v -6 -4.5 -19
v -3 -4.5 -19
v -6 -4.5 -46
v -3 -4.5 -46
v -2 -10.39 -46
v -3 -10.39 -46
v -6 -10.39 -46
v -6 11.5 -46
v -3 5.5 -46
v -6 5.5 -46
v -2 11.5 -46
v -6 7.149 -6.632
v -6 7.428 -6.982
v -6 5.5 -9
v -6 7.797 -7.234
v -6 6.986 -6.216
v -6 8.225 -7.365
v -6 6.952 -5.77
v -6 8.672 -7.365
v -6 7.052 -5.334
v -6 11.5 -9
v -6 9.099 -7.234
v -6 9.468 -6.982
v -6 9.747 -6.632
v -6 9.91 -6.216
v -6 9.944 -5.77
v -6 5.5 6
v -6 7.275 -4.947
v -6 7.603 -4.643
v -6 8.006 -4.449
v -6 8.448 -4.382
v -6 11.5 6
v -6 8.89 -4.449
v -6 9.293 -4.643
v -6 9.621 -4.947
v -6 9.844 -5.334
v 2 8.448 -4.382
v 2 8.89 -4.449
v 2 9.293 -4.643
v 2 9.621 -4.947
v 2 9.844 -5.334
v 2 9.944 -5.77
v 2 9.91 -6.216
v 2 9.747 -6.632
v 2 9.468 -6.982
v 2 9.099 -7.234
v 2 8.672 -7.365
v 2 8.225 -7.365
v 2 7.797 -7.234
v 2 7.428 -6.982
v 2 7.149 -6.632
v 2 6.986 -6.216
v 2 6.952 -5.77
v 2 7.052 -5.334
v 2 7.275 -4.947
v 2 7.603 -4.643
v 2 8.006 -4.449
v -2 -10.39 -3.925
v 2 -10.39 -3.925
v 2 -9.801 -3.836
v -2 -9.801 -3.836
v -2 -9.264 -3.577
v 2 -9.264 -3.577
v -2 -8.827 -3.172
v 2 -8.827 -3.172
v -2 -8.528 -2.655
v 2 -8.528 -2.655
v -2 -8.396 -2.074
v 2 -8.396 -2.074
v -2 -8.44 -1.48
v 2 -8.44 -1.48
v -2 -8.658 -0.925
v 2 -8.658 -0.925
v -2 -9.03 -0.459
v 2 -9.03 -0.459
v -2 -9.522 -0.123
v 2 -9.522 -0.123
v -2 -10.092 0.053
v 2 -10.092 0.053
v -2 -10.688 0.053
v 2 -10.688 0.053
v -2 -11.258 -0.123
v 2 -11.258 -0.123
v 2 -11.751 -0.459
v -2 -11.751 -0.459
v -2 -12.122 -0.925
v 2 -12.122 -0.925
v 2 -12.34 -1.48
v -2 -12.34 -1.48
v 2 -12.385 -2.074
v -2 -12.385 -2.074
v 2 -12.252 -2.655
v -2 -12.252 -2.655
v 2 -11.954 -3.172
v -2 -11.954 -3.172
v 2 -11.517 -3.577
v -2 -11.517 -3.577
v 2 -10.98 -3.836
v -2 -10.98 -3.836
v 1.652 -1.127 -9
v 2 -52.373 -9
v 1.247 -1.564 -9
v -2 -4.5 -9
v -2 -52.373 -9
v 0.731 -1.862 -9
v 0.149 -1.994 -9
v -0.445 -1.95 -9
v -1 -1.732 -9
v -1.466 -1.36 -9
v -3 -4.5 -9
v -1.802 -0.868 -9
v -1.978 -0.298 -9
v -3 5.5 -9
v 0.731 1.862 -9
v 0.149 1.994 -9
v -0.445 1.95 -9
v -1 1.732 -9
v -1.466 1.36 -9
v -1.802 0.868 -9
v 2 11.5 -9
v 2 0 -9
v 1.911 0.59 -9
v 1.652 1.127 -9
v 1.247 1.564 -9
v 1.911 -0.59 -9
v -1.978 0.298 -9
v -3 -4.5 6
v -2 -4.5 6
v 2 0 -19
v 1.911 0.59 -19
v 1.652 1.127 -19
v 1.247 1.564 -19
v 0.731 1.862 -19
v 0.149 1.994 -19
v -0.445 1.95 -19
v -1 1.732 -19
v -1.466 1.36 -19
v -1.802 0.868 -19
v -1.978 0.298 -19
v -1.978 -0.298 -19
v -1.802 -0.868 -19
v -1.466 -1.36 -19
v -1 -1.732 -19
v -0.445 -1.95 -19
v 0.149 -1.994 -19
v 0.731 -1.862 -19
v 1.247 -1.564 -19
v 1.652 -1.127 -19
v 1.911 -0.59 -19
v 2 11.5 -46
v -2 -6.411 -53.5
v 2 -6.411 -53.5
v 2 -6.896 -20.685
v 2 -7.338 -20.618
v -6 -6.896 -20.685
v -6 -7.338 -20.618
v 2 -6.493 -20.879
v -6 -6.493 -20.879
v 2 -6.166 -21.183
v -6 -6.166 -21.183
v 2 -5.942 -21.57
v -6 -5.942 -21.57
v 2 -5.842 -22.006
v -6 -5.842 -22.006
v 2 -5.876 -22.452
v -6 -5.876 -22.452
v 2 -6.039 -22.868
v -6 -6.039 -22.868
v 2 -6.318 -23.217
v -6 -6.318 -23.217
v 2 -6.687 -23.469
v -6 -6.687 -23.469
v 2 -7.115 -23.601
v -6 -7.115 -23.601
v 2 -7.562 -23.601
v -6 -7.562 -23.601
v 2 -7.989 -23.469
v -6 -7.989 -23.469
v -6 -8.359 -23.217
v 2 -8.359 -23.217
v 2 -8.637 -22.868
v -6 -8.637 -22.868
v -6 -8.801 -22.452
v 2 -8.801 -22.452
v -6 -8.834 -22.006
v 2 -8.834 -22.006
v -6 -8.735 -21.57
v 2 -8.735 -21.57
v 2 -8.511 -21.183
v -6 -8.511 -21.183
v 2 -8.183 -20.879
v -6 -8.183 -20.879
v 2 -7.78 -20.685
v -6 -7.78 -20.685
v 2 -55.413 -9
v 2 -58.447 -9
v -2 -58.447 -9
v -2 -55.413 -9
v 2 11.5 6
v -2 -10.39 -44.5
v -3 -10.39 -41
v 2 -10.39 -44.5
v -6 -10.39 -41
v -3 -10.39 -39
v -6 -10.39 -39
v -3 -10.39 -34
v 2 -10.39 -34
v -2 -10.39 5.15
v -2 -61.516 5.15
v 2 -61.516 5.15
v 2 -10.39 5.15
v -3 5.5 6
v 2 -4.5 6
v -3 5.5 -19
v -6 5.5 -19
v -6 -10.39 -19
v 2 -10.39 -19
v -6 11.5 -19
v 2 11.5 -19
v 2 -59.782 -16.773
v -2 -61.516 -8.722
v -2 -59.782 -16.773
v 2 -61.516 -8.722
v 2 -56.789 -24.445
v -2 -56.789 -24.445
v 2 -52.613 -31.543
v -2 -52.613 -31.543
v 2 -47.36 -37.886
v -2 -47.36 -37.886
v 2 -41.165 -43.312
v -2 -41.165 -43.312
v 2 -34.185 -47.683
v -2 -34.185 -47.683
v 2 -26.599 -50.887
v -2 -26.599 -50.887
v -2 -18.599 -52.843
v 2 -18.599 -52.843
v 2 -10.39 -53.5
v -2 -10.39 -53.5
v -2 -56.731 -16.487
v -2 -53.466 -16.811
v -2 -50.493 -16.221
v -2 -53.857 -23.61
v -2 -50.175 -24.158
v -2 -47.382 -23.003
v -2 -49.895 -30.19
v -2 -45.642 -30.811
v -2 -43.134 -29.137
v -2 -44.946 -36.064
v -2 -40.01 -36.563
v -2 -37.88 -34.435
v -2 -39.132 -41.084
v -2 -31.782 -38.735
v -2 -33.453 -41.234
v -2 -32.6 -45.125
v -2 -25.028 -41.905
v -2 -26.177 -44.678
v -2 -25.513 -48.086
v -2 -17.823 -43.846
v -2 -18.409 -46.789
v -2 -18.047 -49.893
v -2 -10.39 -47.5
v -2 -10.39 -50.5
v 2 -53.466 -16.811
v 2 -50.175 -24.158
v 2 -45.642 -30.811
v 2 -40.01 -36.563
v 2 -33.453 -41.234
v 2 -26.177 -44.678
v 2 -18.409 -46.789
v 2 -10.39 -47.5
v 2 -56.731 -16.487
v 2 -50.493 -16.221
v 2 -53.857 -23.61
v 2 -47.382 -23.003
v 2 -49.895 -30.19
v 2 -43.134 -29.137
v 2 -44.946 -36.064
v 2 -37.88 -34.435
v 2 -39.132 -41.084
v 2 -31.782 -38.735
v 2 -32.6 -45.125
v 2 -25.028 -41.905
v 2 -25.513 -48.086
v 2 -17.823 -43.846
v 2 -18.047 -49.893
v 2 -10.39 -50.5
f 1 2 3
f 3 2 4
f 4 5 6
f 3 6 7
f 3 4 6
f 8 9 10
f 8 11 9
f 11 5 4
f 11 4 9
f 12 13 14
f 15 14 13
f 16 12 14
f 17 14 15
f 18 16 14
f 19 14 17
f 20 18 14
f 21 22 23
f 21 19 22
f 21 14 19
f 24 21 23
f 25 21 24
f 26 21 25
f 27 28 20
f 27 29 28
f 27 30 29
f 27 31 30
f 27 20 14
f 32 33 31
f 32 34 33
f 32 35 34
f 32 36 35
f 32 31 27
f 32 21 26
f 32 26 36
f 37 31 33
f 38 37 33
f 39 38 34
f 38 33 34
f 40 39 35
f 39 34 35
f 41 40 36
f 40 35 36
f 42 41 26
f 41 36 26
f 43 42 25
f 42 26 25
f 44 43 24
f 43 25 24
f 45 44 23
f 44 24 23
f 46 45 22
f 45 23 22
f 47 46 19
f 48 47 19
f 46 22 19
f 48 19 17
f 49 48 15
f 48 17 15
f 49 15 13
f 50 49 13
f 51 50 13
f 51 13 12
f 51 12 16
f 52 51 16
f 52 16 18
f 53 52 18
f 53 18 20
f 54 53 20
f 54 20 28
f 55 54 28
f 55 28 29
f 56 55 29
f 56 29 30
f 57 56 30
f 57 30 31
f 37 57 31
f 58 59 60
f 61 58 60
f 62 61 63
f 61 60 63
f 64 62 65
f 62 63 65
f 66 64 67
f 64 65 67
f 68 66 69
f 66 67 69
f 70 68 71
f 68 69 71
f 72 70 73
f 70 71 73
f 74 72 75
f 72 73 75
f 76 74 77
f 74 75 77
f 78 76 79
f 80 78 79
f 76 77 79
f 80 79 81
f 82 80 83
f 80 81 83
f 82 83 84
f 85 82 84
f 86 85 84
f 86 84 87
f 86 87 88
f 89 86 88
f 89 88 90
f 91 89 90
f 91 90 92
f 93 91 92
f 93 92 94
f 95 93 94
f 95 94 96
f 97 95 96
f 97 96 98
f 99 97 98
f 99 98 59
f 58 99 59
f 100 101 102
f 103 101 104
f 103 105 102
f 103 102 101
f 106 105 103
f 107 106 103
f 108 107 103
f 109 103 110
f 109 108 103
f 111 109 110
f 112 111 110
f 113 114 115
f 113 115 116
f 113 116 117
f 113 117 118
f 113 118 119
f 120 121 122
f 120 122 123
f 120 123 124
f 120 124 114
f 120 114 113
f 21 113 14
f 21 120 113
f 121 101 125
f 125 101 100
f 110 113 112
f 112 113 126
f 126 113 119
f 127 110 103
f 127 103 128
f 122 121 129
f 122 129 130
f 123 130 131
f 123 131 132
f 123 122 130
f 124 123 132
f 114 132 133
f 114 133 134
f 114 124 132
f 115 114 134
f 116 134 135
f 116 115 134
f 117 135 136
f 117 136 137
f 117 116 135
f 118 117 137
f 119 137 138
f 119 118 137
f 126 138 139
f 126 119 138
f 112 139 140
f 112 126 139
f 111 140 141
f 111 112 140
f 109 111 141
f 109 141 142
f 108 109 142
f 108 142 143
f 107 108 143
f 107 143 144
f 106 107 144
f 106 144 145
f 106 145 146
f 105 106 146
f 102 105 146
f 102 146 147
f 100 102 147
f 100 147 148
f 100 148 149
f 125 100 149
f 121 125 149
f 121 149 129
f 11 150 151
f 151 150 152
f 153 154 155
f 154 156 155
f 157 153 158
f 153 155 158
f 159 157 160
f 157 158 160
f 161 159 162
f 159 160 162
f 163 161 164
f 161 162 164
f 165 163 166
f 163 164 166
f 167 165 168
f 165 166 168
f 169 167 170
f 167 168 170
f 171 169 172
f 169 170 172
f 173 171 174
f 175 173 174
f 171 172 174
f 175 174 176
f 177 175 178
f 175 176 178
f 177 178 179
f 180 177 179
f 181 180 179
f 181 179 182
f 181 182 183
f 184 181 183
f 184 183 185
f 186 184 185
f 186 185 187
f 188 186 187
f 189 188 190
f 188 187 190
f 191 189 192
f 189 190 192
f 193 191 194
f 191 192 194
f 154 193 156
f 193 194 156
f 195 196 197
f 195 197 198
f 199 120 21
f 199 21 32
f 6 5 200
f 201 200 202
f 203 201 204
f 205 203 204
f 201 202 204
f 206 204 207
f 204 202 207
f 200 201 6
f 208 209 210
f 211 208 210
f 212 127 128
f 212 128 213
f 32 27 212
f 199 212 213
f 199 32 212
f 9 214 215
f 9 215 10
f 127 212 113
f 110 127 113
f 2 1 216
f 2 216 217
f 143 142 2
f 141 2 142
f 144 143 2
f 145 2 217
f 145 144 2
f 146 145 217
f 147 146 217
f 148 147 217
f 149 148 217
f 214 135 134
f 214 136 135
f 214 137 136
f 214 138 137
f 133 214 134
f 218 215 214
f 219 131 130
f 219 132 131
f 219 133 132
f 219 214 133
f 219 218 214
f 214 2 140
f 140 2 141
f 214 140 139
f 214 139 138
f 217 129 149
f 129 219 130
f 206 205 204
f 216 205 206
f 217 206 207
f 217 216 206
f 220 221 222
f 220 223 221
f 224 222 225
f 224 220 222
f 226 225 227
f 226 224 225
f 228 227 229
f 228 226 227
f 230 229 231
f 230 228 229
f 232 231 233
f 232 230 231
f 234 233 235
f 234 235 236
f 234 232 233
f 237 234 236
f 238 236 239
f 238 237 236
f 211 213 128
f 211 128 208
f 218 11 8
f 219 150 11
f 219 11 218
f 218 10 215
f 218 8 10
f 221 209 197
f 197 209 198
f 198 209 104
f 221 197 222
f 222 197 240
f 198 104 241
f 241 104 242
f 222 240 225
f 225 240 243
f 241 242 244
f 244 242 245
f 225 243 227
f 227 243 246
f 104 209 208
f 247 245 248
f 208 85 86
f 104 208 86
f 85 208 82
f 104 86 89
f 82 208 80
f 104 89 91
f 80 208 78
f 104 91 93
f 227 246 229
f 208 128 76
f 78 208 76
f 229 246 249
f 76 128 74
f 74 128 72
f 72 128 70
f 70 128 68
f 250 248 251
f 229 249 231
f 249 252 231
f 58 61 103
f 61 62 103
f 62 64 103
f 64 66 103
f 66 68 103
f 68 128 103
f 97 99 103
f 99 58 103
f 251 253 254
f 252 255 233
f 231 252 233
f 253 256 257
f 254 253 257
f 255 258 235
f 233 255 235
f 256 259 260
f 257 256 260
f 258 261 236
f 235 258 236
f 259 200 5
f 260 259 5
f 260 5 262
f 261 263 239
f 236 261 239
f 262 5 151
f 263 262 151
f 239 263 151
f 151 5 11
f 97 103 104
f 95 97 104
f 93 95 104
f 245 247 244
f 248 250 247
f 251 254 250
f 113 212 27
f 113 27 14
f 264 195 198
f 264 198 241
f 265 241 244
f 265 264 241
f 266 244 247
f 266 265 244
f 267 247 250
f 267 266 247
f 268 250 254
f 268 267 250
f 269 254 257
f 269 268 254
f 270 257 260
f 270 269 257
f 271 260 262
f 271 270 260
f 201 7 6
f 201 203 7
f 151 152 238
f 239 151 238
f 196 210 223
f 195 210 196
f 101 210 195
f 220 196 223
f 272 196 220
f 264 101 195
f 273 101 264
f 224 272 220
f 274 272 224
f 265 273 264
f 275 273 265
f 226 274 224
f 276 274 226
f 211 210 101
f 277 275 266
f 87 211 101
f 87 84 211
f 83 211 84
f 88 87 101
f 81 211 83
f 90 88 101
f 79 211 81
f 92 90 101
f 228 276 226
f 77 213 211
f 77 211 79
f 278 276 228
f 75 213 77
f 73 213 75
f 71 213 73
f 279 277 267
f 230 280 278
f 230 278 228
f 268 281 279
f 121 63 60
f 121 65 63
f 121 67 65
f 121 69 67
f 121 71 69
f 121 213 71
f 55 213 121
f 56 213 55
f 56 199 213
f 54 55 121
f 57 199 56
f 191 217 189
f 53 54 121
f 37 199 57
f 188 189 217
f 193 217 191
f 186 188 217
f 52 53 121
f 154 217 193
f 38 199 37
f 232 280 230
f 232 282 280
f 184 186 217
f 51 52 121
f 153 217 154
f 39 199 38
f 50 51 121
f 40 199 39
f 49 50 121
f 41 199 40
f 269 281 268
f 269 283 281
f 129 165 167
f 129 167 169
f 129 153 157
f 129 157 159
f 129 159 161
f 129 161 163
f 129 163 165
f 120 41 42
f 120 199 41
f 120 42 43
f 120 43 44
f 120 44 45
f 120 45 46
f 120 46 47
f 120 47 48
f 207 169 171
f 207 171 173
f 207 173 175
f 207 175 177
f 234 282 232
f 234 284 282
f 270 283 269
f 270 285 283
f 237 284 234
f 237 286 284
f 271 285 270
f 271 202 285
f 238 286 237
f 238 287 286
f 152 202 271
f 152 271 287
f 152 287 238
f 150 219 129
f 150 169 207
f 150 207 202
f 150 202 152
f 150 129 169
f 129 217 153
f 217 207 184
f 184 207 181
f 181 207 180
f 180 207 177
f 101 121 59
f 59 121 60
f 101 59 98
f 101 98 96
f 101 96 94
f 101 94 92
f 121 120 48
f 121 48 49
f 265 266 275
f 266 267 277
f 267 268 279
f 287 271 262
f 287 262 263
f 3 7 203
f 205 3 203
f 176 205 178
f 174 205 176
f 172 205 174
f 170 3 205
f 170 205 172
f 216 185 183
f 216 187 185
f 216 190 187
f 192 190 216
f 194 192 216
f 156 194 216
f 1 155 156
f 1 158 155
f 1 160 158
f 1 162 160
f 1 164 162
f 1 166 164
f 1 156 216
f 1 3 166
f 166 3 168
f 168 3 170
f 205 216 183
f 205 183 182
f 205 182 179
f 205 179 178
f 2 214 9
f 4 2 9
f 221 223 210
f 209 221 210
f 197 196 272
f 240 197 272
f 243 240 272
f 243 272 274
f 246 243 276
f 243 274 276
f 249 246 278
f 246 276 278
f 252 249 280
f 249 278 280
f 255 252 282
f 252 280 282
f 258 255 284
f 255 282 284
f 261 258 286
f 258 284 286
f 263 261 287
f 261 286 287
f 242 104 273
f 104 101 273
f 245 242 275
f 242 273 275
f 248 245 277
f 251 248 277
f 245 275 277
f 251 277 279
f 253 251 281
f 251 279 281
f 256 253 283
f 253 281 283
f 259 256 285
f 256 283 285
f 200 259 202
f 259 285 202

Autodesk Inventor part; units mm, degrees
ref_plane "YZ Plane" through (0, 0, 0) normal (1, 0, 0) x (0, 1, 0)
ref_plane "XZ Plane" through (0, 0, 0) normal (0, 1, 0) x (-1, 0, 0)
ref_plane "XY Plane" through (0, 0, 0) normal (0, 0, 1) x (1, 0, 0)
sketch "Sketch1" plane through (0, 0, 0) normal (0, 0, 1) x (1, 0, 0)
  circle A0 centre (0, 0) radius 2
  dimension "d0" = 4
extrude "Extrusion1" add sketch "Sketch1" against normal blind 40
sketch "Sketch2" plane through (0, 0, 0) normal (0, 0, 1) x (1, 0, 0)
  circle A0 centre (0, 0) radius 2 projected
  line L0 (2, -4.5) -> (-3, -4.5)
  line L1 (-3, -4.5) -> (-3, 4.5)
  line L2 (-3, 4.5) -> (2, 4.5)
  line L3 (2, 4.5) -> (2, -4.5)
  dimension "d3" = 3
  dimension "d4" = 9
  dimension "d5" = 4.5
extrude "Extrusion2" add sketch "Sketch2" along normal blind 6 contours A0 | L3 L0 L1 L2
sketch "Sketch3" plane through (0, 0, 6) normal (0, 0, 1) x (1, 0, 0)
  circle A0 centre (0, 0) radius 2 projected
  line L0 (-3, -4.5) -> (2, -4.5) projected
  line L1 (2, -4.5) -> (2, 4.5) projected
  line L2 (2, 4.5) -> (-3, 4.5) projected
  line L3 (-3, 4.5) -> (-3, -4.5) projected
  line L4 (2, -4.5) -> (2, 4.5) projected
  line L5 (-3, 4.5) -> (2, 4.5)
  line L6 (2, 4.5) -> (2, 3.5)
  line L7 (2, 3.5) -> (-3, 3.5)
  line L8 (-3, 3.5) -> (-3, 4.5)
  point P0 (2, 0)
  dimension "d8" = 1
extrude "Extrusion3" cut sketch "Sketch3" against normal blind 6 contours L7 L3 L2 L1
sketch "Sketch4" plane through (0, 0, -40) normal (0, 0, -1) x (-1, 0, 0)
  circle A0 centre (0, 0) radius 2 projected
extrude "Extrusion4" cut sketch "Sketch4" against normal blind 6
sketch "Sketch5" plane through (0, 0, -34) normal (0, 0, -1) x (-1, 0, 0)
  line L0 (3, 3.5) -> (-2, 3.5) projected
  line L1 (3, -4.5) -> (3, 3.5) projected
  line L2 (-2, 3.5) -> (-2, 0) projected
  line L3 (-2, 0) -> (-2, -4.5) projected
  line L4 (-2, -4.5) -> (3, -4.5) projected
  line L5 (3, 3.5) -> (-2, 3.5)
  line L6 (-2, 3.5) -> (-2, -4.5)
  line L7 (-2, -4.5) -> (3, -4.5)
  line L8 (3, -4.5) -> (3, 3.5)
  point P0 (0, 0)
extrude "Extrusion5" add sketch "Sketch5" along normal blind 12
sketch "Sketch6" plane through (-3, -4.5, -34) normal (0, -1, 0) x (1, 0, 0)
  line L0 (5, 0) -> (0, 0) projected
  line L1 (0, 0) -> (0, -12) projected
  line L2 (5, -12) -> (0, -12) projected
  line L3 (5, 0) -> (5, -12) projected
  line L4 (5, -12) -> (0, -12)
  line L5 (0, -12) -> (0, 0)
  line L6 (0, 0) -> (5, 0)
  line L7 (5, 0) -> (5, -12)
  point P0 (3, 34)
extrude "Extrusion6" add sketch "Sketch6" along normal blind 110
sketch "Sketch7" plane through (2, 0, -34) normal (1, 0, 0) x (0, 0, -1)
  line L0 (0, 3.5) -> (0, 0) projected
  line L1 (0, 0) -> (0, -114.5) projected
  line L2 (12, -114.5) -> (0, -114.5) projected
  line L3 (12, 3.5) -> (12, -114.5) projected
  line L4 (0, 3.5) -> (12, 3.5) projected
  line L5 (-34, 3.5) -> (-40, 3.5) projected
  line L6 (-40, -4.5) -> (-40, 3.5) projected
  line L7 (-34, -4.5) -> (-40, -4.5) projected
  line L8 (-34, 0) -> (-34, -4.5) projected
  line L9 (-34, 3.5) -> (-34, 0) projected
  line L10 (0, 3.5) -> (0, -114.5) projected
  line L11 (0, -108.5) -> (-25, -108.5)
  line L12 (-25, -108.5) -> (-25, -114.5)
  line L13 (-25, -114.5) -> (0, -114.5)
  line L14 (0, -114.5) -> (0, -108.5)
  line L15 (0, -114.5) -> (12, -114.5) projected
  line L16 (-40, -4.5) -> (-25, -108.5)
  line L17 (-34, -4.5) -> (-19, -108.5)
  point P0 (-34, 0)
  dimension "d46" = 6
  dimension "d47" = 25
extrude "Extrusion7" add sketch "Sketch7" against normal up to surface (5 mm away) contours L1 L13 L12 L11 | L11 L16 L7 L17 | L7 L6 L5 L9 L8
sketch "Sketch8" plane through (2, 3.5, 6) normal (1, 0, 0) x (0, 0, -1)
  line L0 (6, 0) -> (0, 0) projected
  line L1 (45, -10) -> (47, -10)
  line L2 (47, -10) -> (47, -112)
  line L3 (47, -112) -> (45, -112)
  line L4 (45, -112) -> (45, -10)
  line L5 (0, -8) -> (0, 0) projected
  line L6 (6, -3.5) -> (6, -8) projected
  line L7 (6, 0) -> (6, -3.5) projected
  line L8 (0, -8) -> (15, -112) projected
  line L9 (15, -112) -> (15, -118) projected
  line L10 (52, -118) -> (15, -118) projected
  line L11 (52, 0) -> (52, -118) projected
  line L12 (40, 0) -> (52, 0) projected
  line L13 (40, 0) -> (40, -3.5) projected
  line L14 (40, -3.5) -> (40, -112) projected
  line L15 (40, -112) -> (21, -112) projected
  line L16 (21, -112) -> (6, -8) projected
  dimension "d20" = 2
  dimension "d48" = 6
  dimension "d49" = 5
  dimension "d50" = 10
extrude "Extrusion8" cut sketch "Sketch8" against normal through all contours L1 L2 L3 L4
sketch "Sketch9" plane through (-3, 3.5, 0) normal (-1, 0, 0) x (0, 0, 1)
  line L0 (6, 0) -> (0, 0) projected
  line L1 (-46, 0) -> (-46, -118) projected
  line L2 (-46, -8) -> (-46, -9)
  line L3 (-34, -3.5) -> (-34, -112) projected
  line L4 (-34, -8) -> (-34, -9)
  line L5 (0, -8) -> (-0.8495, -13.8902)
  line L6 (-46, -9) -> (-34, -9)
  line L7 (6, -8) -> (0, -8)
  line L8 (-34, -8) -> (-46, -8)
  line L9 (0, -8) -> (0, 0) projected
  line L10 (6, 0) -> (6, -8) projected
  line L11 (-15, -112) -> (0, -8) projected
  line L12 (-34, -112) -> (-15, -112) projected
  line L13 (-34, 0) -> (-34, -112) projected
  line L14 (-34, 0) -> (-46, 0) projected
  line L15 (-46, 0) -> (-46, -118) projected
  line L16 (-9, -118) -> (-46, -118) projected
  line L17 (-9, -112) -> (-9, -118) projected
  line L18 (6, -8) -> (-9, -112) projected
  line L19 (-15, -112) -> (0, -8) projected
  line L20 (6, -8) -> (5.1505, -13.8902)
  line L21 (6, -8) -> (-9, -112) projected
  line L22 (5.1505, -13.8902) -> (-0.8495, -13.8902)
  line L23 (-15, -112) -> (0, -8) projected
  line L24 (-46, -9) -> (-34, -9)
  line L25 (-34, -9) -> (-34, -18.1174)
  line L26 (-34, -18.1174) -> (-46, -18.1174)
  line L27 (-46, -18.1174) -> (-46, -9)
  line L28 (-41, -9) -> (-41, -18.1174)
  line L29 (-41, -10) -> (-41, -112) projected
  line L30 (-39, -10) -> (-39, -112) projected
  line L31 (-39, -18.1174) -> (-39, -9)
  line L32 (-39, -10) -> (-39, -112) projected
  line L33 (-39, -112) -> (-41, -112) projected
  line L34 (-41, -112) -> (-41, -10) projected
  line L35 (-41, -10) -> (-39, -10) projected
  point P0 (0, -3.5)
  point P1 (-40, -8)
  point P2 (-39, 0)
  point P3 (-41, 0)
extrude "Extrusion9" add sketch "Sketch9" along normal blind 3.5 contours L18 L22 L5 L7 | L26 L30 L31 L6 L3 | L1 L6 L28 L26 | L6 L1 L8 L3
sketch "Sketch10" plane through (-3, 3.5, 6) normal (0, 1, 0) x (1, 0, 0)
  line L0 (2.5037, 5.3678) -> (4.55, 1.815)
  line L1 (4.55, 1.815) -> (2.4963, 0.6322)
  line L2 (2.4963, 0.6322) -> (0.45, 4.185)
  line L3 (0.45, 4.185) -> (2.5037, 5.3678)
  line L4 (0.45, 4.185) -> (4.55, 4.185)
  line L5 (4.55, 4.185) -> (4.55, 1.815)
  line L6 (4.55, 1.815) -> (0.45, 1.815)
  line L7 (0.45, 1.815) -> (0.45, 4.185)
  line L8 (2.5037, 5.3678) -> (4.55, 4.185)
  line L9 (0.45, 1.815) -> (2.4963, 0.6322)
  line L10 (2.4963, 45.3678) -> (4.5537, 41.8214)
  line L11 (4.5537, 41.8214) -> (2.5037, 40.6322)
  line L12 (2.5037, 40.6322) -> (0.4463, 44.1786)
  line L13 (0.4463, 44.1786) -> (2.4963, 45.3678)
  line L14 (0.4463, 44.1786) -> (4.5463, 44.1914)
  line L15 (4.5463, 44.1914) -> (4.5537, 41.8214)
  line L16 (4.5537, 41.8214) -> (0.4537, 41.8086)
  line L17 (0.4537, 41.8086) -> (0.4463, 44.1786)
  line L18 (2.4963, 45.3678) -> (4.5463, 44.1914)
  line L19 (0.4537, 41.8086) -> (2.5037, 40.6322)
  line L20 (4.4304, 1.8841) -> (2.4963, 0.6322)
  line L21 (0.4537, 41.8086) -> (4.5463, 44.1914)
  line L22 (4.5537, 41.8214) -> (0.4463, 44.1786)
  line L23 (2.5037, 40.6322) -> (2.4963, 45.3678)
  line L24 (5, 0) -> (0, 0) projected
  line L25 (0, 0) -> (0, 6) projected
  line L26 (0, 40) -> (5, 40) projected
  line L27 (0, 40) -> (0, 52) projected
  point P0 (3, 6)
  point P1 (11, 0)
  point P2 (11, 0)
  point P3 (2.5, 43)
  point P4 (2.5, 3)
  dimension "d28" = 4.1
  dimension "d29" = 2.37
  dimension "d30" = 4.1
  dimension "d31" = 2.37
  dimension "d33" = 4.1
  dimension "d34" = 2.37
  dimension "d35" = 4.1
  dimension "d36" = 2.37
  dimension "d38" = 3
  dimension "d39" = 2.5
  dimension "d40" = 3
  dimension "d41" = 2.5
sketch "Sketch11" plane through (-3, 3.5, -34) normal (0, 1, 0) x (1, 0, 0)
  line L0 (0, 0) -> (5, 0) projected
  line L1 (5, 0) -> (5, 12) projected
  line L2 (0, 12) -> (5, 12) projected
  line L3 (0, 0) -> (0, 12) projected
  line L4 (5, -40) -> (0, -40) projected
  line L5 (5, -34) -> (5, -40) projected
  line L6 (0, -34) -> (5, -34) projected
  line L7 (0, -40) -> (0, -34) projected
  point P0 (3, -34)
extrude "Extrusion12" add sketch "Sketch11" along normal blind 2
sketch "Sketch12" plane through (2, -114.5, -9) normal (1, 0, 0) x (0, 0, -1)
  line L0 (30, 6) -> (30, 108) projected
  line L1 (30, 108) -> (32, 108) projected
  line L2 (32, 108) -> (32, 6) projected
  line L3 (32, 6) -> (30, 6) projected
  line L4 (-15, 110) -> (-15, 120) projected
  line L5 (-15, 110) -> (0, 6) projected
  line L6 (0, 6) -> (0, 0) projected
  line L7 (37, 0) -> (0, 0) projected
  line L8 (37, 0) -> (37, 120) projected
  line L9 (25, 120) -> (37, 120) projected
  line L10 (25, 114.5) -> (25, 120) projected
  line L11 (25, 114.5) -> (25, 6) projected
  line L12 (25, 6) -> (6, 6) projected
  line L13 (6, 6) -> (-9, 110) projected
  line L14 (-9, 114.5) -> (-9, 110) projected
  line L15 (-9, 120) -> (-9, 114.5) projected
  line L16 (-15, 120) -> (-9, 120) projected
  line L17 (-15, 120) -> (-9, 120)
  line L18 (-9, 120) -> (-9, 126)
  line L19 (-9, 126) -> (-15, 126)
  line L20 (-15, 126) -> (-15, 120)
  line L21 (25, 120) -> (37, 120)
  line L22 (37, 120) -> (37, 126)
  line L23 (37, 126) -> (25, 126)
  line L24 (25, 126) -> (25, 120)
  dimension "d53" = 6
extrude "Extrusion13" add sketch "Sketch12" against normal up to surface (8.5 mm away) contours L20 L19 L18 L16 | L9 L24 L23 L22
sketch "Sketch13" plane through (-6.5, 5.5, -46) normal (-1, 0, 0) x (0, 0, 1)
  line L0 (0, 0) -> (0, 6) projected
  line L1 (12, 0) -> (0, 0) projected
  line L2 (12, 6) -> (12, 0) projected
  line L3 (0, 6) -> (12, 6) projected
  line L4 (5, -11) -> (7, -11) projected
  line L5 (7, -11) -> (7, -20.1174) projected
  line L6 (7, -20.1174) -> (12, -20.1174) projected
  line L7 (12, -20.1174) -> (12, -10) projected
  line L8 (12, -10) -> (0, -10) projected
  line L9 (0, -10) -> (0, -20.1174) projected
  line L10 (0, -20.1174) -> (5, -20.1174) projected
  line L11 (5, -20.1174) -> (5, -11) projected
  line L12 (52, -10) -> (46, -10) projected
  line L13 (46, -10) -> (45.1505, -15.8902) projected
  line L14 (45.1505, -15.8902) -> (51.1505, -15.8902) projected
  line L15 (51.1505, -15.8902) -> (52, -10) projected
  line L16 (46, 0) -> (46, 6) projected
  line L17 (52, 0) -> (46, 0) projected
  line L18 (52, 6) -> (52, 0) projected
  line L19 (46, 6) -> (52, 6) projected
  point P0 (46, -5.5)
extrude "Extrusion14" cut sketch "Sketch13" against normal blind 0.5
sketch "Sketch14" plane through (0, 0, -34) normal (0, 0, 1) x (1, 0, 0)
  line L0 (-6, 11.5) -> (-6, 5.5) projected
  line L1 (-3, 5.5) -> (-6, 5.5) projected
  line L2 (-3, 5.5) -> (-3, -4.5) projected
  line L3 (-3, -4.5) -> (-6, -4.5) projected
  line L4 (-6, -4.5) -> (-6, -14.6174) projected
  line L5 (-3, -14.6174) -> (-6, -14.6174) projected
  line L6 (-3, -14.6174) -> (-3, -108.5) projected
  line L7 (-3, -108.5) -> (2, -108.5) projected
  line L8 (2, 0) -> (2, -108.5) projected
  circle A0 centre (0, 0) radius 2 projected
  line L9 (2, 0) -> (2, 11.5) projected
  line L10 (2, 11.5) -> (-6, 11.5) projected
  line L11 (2, 0) -> (2, 11.5) projected
  line L12 (-6, 11.5) -> (2, 11.5)
  line L13 (2, 11.5) -> (2, 5.5)
  line L14 (2, 5.5) -> (-6, 5.5)
  line L15 (-6, 5.5) -> (-6, 11.5)
  line L16 (2, 5.5) -> (-3, 5.5)
  line L17 (-3, 5.5) -> (-3, -4.5)
  line L18 (-3, -4.5) -> (2, -4.5)
  line L19 (2, -4.5) -> (2, 5.5)
  line L20 (-6, -14.6174) -> (2, -14.6174)
  line L21 (2, -14.6174) -> (2, -4.5)
  line L22 (2, -4.5) -> (-6, -4.5)
  line L23 (-6, -4.5) -> (-6, -14.6174)
extrude "Extrusion15" add sketch "Sketch14" along normal blind 15 contours L10 L9 L14 L1 L0 | A0 | L14 L9 L8 L18 L2 | L18 L8 L20 L5 L4 L3
sketch "Sketch15" plane through (0, 0, 0) normal (0, 0, -1) x (-1, 0, 0)
  line L0 (6, 5.5) -> (6, 11.5) projected
  line L1 (-2, 11.5) -> (6, 11.5) projected
  line L2 (-2, 11.5) -> (-2, 0) projected
  circle A0 centre (0, 0) radius 2 projected
  line L3 (-2, 0) -> (-2, -4.5) projected
  line L4 (-2, -4.5) -> (3, -4.5) projected
  line L5 (3, -4.5) -> (3, 5.5) projected
  line L6 (3, 5.5) -> (6, 5.5) projected
  line L7 (6, -10.3902) -> (6, -4.5) projected
  line L8 (3, -4.5) -> (6, -4.5) projected
  line L9 (-2, -4.5) -> (3, -4.5) projected
  line L10 (-2, -108.5) -> (-2, -4.5) projected
  line L11 (3, -108.5) -> (-2, -108.5) projected
  line L12 (3, -108.5) -> (3, -10.3902) projected
  line L13 (3, -10.3902) -> (6, -10.3902) projected
  line L14 (-2, 11.5) -> (-2, 0) projected
  line L15 (6, 11.5) -> (-2, 11.5)
  line L16 (-2, 11.5) -> (-2, 5.5)
  line L17 (-2, 5.5) -> (6, 5.5)
  line L18 (6, 5.5) -> (6, 11.5)
  line L19 (-2, 5.5) -> (3, 5.5)
  line L20 (3, 5.5) -> (3, -4.5)
  line L21 (3, -4.5) -> (-2, -4.5)
  line L22 (-2, -4.5) -> (-2, 5.5)
  line L23 (6, -10.3902) -> (-2, -10.3902)
  line L24 (-2, -10.3902) -> (-2, -4.5)
  line L25 (-2, -4.5) -> (6, -4.5)
  line L26 (6, -4.5) -> (6, -10.3902)
extrude "Extrusion16" add sketch "Sketch15" along normal blind 9 contours L6 L17 L2 L1 L0 | A0 | L5 L4 L3 L2 L17 | L8 L7 L13 L23 L10 L4
sketch "Sketch16" plane through (-3, -14.6174, -39) normal (0, -1, 0) x (1, 0, 0)
  line L0 (-3, 20) -> (-3, 0) projected
  line L1 (0, 0) -> (-3, 0) projected
  line L2 (0, 5) -> (0, 0) projected
  line L3 (5, 5) -> (0, 5) projected
  line L4 (5, 5) -> (5, 20) projected
  line L5 (-3, 20) -> (5, 20) projected
  line L6 (-3, -2) -> (-3, -7) projected
  line L7 (0, -7) -> (-3, -7) projected
  line L8 (0, -2) -> (0, -7) projected
  line L9 (0, -2) -> (-3, -2) projected
  point P0 (3, 39)
extrude "Extrusion17" cut sketch "Sketch16" against normal up to surface (4.2273 mm away)
sketch "Sketch17" plane through (-6, 5.5, -46) normal (-1, 0, 0) x (0, 0, 1)
  line L0 (0, -15.8902) -> (5, -15.8902) projected
  line L1 (5, -11) -> (5, -15.8902) projected
  line L2 (7, -11) -> (5, -11) projected
  line L3 (7, -15.8902) -> (7, -11) projected
  line L4 (7, -15.8902) -> (27, -15.8902) projected
  line L5 (27, -10) -> (27, -15.8902) projected
  line L6 (0, -10) -> (27, -10) projected
  line L7 (0, -15.8902) -> (0, -10) projected
  line L8 (5, -11) -> (7, -11)
  line L9 (7, -11) -> (7, -15.8902)
  line L10 (7, -15.8902) -> (5, -15.8902)
  line L11 (5, -15.8902) -> (5, -11)
  point P0 (46, -5.5)
extrude "Extrusion18" add sketch "Sketch17" against normal up to surface (8 mm away) contours L1 L2 L3 L10
sketch "Sketch18" plane through (-6, 5.5, -46) normal (-1, 0, 0) x (0, 0, 1)
  line L0 (38.9361, 5) -> (42.4857, 2.9481)
  line L1 (42.4857, 2.9481) -> (41.2996, 0.8963)
  line L2 (41.2996, 0.8963) -> (37.75, 2.9481)
  line L3 (37.75, 2.9481) -> (38.9361, 5)
  line L4 (37.75, 2.9481) -> (41.2996, 5)
  line L5 (41.2996, 5) -> (42.4857, 2.9481)
  line L6 (42.4857, 2.9481) -> (38.9361, 0.8963)
  line L7 (38.9361, 0.8963) -> (37.75, 2.9481)
  line L8 (38.9361, 5) -> (41.2996, 5)
  line L9 (38.9361, 0.8963) -> (41.2996, 0.8963)
  line L10 (52, 0) -> (37, 0) projected
  line L11 (52, 6) -> (52, 0) projected
  line L12 (37, 6) -> (52, 6) projected
  line L13 (37, 0) -> (37, 6) projected
  line L14 (0, 0) -> (0, 6) projected
  line L15 (27, 0) -> (0, 0) projected
  line L16 (27, 6) -> (27, 0) projected
  line L17 (0, 6) -> (27, 6) projected
  line L18 (37, 6) -> (52, 6) projected
  line L19 (0, 6) -> (27, 6) projected
  line L20 (22.7004, 5) -> (26.25, 2.9481)
  line L21 (26.25, 2.9481) -> (25.0639, 0.8963)
  line L22 (25.0639, 0.8963) -> (21.5143, 2.9481)
  line L23 (21.5143, 2.9481) -> (22.7004, 5)
  line L24 (21.5143, 2.9481) -> (25.0639, 5)
  line L25 (25.0639, 5) -> (26.25, 2.9481)
  line L26 (26.25, 2.9481) -> (22.7004, 0.8963)
  line L27 (22.7004, 0.8963) -> (21.5143, 2.9481)
  line L28 (22.7004, 5) -> (25.0639, 5)
  line L29 (22.7004, 0.8963) -> (25.0639, 0.8963)
  line L30 (38.9361, -10.7865) -> (42.4857, -12.8383)
  line L31 (42.4857, -12.8383) -> (41.2996, -14.8902)
  line L32 (41.2996, -14.8902) -> (37.75, -12.8383)
  line L33 (37.75, -12.8383) -> (38.9361, -10.7865)
  line L34 (37.75, -12.8383) -> (41.2996, -10.7865)
  line L35 (41.2996, -10.7865) -> (42.4857, -12.8383)
  line L36 (42.4857, -12.8383) -> (38.9361, -14.8902)
  line L37 (38.9361, -14.8902) -> (37.75, -12.8383)
  line L38 (38.9361, -10.7865) -> (41.2996, -10.7865)
  line L39 (38.9361, -14.8902) -> (41.2996, -14.8902)
  line L40 (22.7004, -10.7865) -> (26.25, -12.8383)
  line L41 (26.25, -12.8383) -> (25.0639, -14.8902)
  line L42 (25.0639, -14.8902) -> (21.5143, -12.8383)
  line L43 (21.5143, -12.8383) -> (22.7004, -10.7865)
  line L44 (21.5143, -12.8383) -> (25.0639, -10.7865)
  line L45 (25.0639, -10.7865) -> (26.25, -12.8383)
  line L46 (26.25, -12.8383) -> (22.7004, -14.8902)
  line L47 (22.7004, -14.8902) -> (21.5143, -12.8383)
  line L48 (22.7004, -10.7865) -> (25.0639, -10.7865)
  line L49 (22.7004, -14.8902) -> (25.0639, -14.8902)
  line L50 (0, -15.8902) -> (27, -15.8902) projected
  line L51 (27, -10) -> (27, -15.8902) projected
  line L52 (0, -10) -> (27, -10) projected
  line L53 (0, -15.8902) -> (0, -10) projected
  line L54 (51.1505, -15.8902) -> (37, -15.8902) projected
  line L55 (52, -10) -> (51.1505, -15.8902) projected
  line L56 (37, -10) -> (52, -10) projected
  line L57 (37, -15.8902) -> (37, -10) projected
  line L58 (0, -15.8902) -> (27, -15.8902) projected
  line L59 (51.1505, -15.8902) -> (37, -15.8902) projected
  dimension "d66" = 4.1
  dimension "d67" = 2.37
  dimension "d68" = 4.1
  dimension "d69" = 2.37
  dimension "d79" = 0.75
  dimension "d80" = 1
  dimension "d81" = 4.1
  dimension "d82" = 2.37
  dimension "d83" = 4.1
  dimension "d84" = 2.37
  dimension "d85" = 0.75
  dimension "d88" = 4.1
  dimension "d89" = 2.37
  dimension "d90" = 4.1
  dimension "d91" = 2.37
  dimension "d92" = 4.1
  dimension "d93" = 2.37
  dimension "d94" = 4.1
  dimension "d95" = 2.37
  dimension "d96" = 1
extrude "Extrusion19" [suppressed]
sketch "Sketch19" plane through (2, -108.5, -15) normal (1, 0, 0) x (0, 0, -1)
  line L0 (-6, 104) -> (-21, 104) projected
  line L1 (4, 98.1098) -> (19, 98.1098) projected
  line L2 (19, 98.1098) -> (19, 0) projected
  line L3 (19, 0) -> (0, 0) projected
  line L4 (0, 0) -> (-14.1505, 98.1098) projected
  line L5 (-14.1505, 98.1098) -> (-6, 98.1098) projected
  line L6 (-6, 108.5) -> (-6, 98.1098) projected
  line L7 (-6, 120) -> (-6, 108.5) projected
  line L8 (-6, 120) -> (-21, 120) projected
  line L9 (-21, 104) -> (-21, 120) projected
  line L10 (-21, 104) -> (-6, 0) projected
  line L11 (-6, 0) -> (-6, -6) projected
  line L12 (31, -6) -> (-6, -6) projected
  line L13 (31, -6) -> (31, 120) projected
  line L14 (31, 120) -> (4, 120) projected
  line L15 (4, 108.5) -> (4, 120) projected
  line L16 (4, 98.1098) -> (4, 108.5) projected
  line L17 (26, 98.1098) -> (24, 98.1098) projected
  line L18 (26, 98.1098) -> (26, 0) projected
  line L19 (26, 0) -> (24, 0) projected
  line L20 (24, 0) -> (24, 98.1098) projected
  line L21 (31, 98.1098) -> (-21, 98.1098)
  line L22 (-21, 98.1098) -> (-21, -6)
  line L23 (-21, -6) -> (31, -6)
  line L24 (31, -6) -> (31, 98.1098)
  point P0 (-15, 108.5)
extrude "Extrusion20" cut sketch "Sketch19" against normal through all contours L21 L1 L2 L3 L4 L5 | L21 L4 L3 L2 L20 L19 L18 L13 L12 L11 L10 | L10 L11 L23 L22 L21
sketch "Sketch20" plane through (-6, -10.3902, 5.1505) normal (0, -1, 0) x (1, 0, 0)
  line L0 (0, 0) -> (8, 0) projected
  line L1 (0, 0) -> (0, -14.1505) projected
  line L2 (8, -14.1505) -> (0, -14.1505) projected
  line L3 (8, 0) -> (8, -14.1505) projected
  point P0 (6, -5.1505)
extrude "Extrusion21" add sketch "Sketch20" along normal blind 40
sketch "Sketch22" plane through (-6, 5.5, -46) normal (-1, 0, 0) x (0, 0, 1)
  line L0 (52, -10) -> (51.1505, -15.8902) projected
  line L1 (37, -10) -> (52, -10) projected
  line L2 (37, -10) -> (37, -55.8902) projected
  line L3 (51.1505, -55.8902) -> (37, -55.8902) projected
  line L4 (51.1505, -15.8902) -> (51.1505, -55.8902) projected
  line L5 (0, -15.8902) -> (27, -15.8902) projected
  line L6 (27, -10) -> (27, -15.8902) projected
  line L7 (0, -10) -> (27, -10) projected
  line L8 (0, -15.8902) -> (0, -10) projected
  line L9 (37, -10) -> (37, -55.8902) projected
  line L10 (37, -15.8902) -> (51.1505, -15.8902)
  line L11 (51.1505, -15.8902) -> (51.1505, -55.8902)
  line L12 (51.1505, -55.8902) -> (37, -55.8902)
  line L13 (37, -55.8902) -> (37, -15.8902)
  point P0 (46, -5.5)
extrude "Extrusion22" cut sketch "Sketch22" against normal blind 2 contours L4 L3 L2 L10
sketch "Sketch23" plane through (2, -4.5, 6) normal (1, 0, 0) x (0, 0, -1)
  line L0 (15, 4.5) -> (15, -45.8902) projected
  line L1 (15, 16) -> (15, 4.5) projected
  line L2 (15, 16) -> (0, 16) projected
  line L3 (0, 0) -> (0, 16) projected
  line L4 (0, 0) -> (0.8495, -5.8902) projected
  line L5 (0.8495, -5.8902) -> (0.8495, -45.8902) projected
  line L6 (15, -45.8902) -> (0.8495, -45.8902) projected
  line L7 (25, -5.8902) -> (52, -5.8902) projected
  line L8 (52, -5.8902) -> (52, 16) projected
  line L9 (52, 16) -> (25, 16) projected
  line L10 (25, 4.5) -> (25, 16) projected
  line L11 (25, -5.8902) -> (25, 4.5) projected
  line L12 (15, -5.8902) -> (0.8495, -5.8902) projected
  arc A0 (15, -49.3938) -> (52, -5.8902) centre (7.9248, -5.8902) ccw
  line L13 (15, -45.8902) -> (0.8495, -45.8902)
  line L14 (0.8495, -45.8902) -> (0.8495, -55.4631)
  line L15 (0.8495, -55.4631) -> (15, -55.4631)
  line L16 (15, -49.3938) -> (15, -45.8902)
  line L17 (58, -5.8902) -> (58, -1.9112)
  line L18 (58, -1.9112) -> (52, -1.9112)
  line L19 (52, -1.9112) -> (52, -5.8902)
  line L20 (15, -49.3938) -> (0.8495, -49.3938)
  line L21 (0.8495, -49.3938) -> (0.8495, -45.8902)
  line L22 (0.8495, -45.8902) -> (15, -45.8902)
  arc A1 (15, -55.4631) -> (58, -5.8902) centre (7.9248, -5.8902) ccw
  arc A2 (14.7799, -50.9469) -> (53.5, -5.8902) centre (7.9248, -5.8902) ccw
  arc A3 (14.9729, -53.9514) -> (56.5, -5.8902) centre (7.9248, -5.8902) ccw
  line L23 (52, -5.8902) -> (53.5, -5.8902)
  line L24 (56.5, -5.8902) -> (58, -5.8902)
  line L25 (15, -55.4631) -> (15, -53.9474)
  line L26 (15, -50.9129) -> (15, -49.3938)
  line L27 (53.5, -5.8902) -> (56.5, -5.8902)
  line L28 (15, -53.9474) -> (15, -50.9129)
  point P0 (6, 4.5)
  dimension "d104" = 6
  dimension "d105" = 3
  dimension "d106" = 1.5
extrude "Extrusion23" add sketch "Sketch23" against normal blind 4 contours L16 L20 L14 L6 | L26 L28 L25 L15 L14 L20 | A0 L23 A2 L26 | L8 L18 L17 L24 L27 L23 | A3 L24 A1 L25
sketch "Sketch24" plane through (2, -4.5, 6) normal (1, 0, 0) x (0, 0, -1)
  line L0 (15, -53.9474) -> (15, -50.9129) projected
  arc A0 (15, -50.9129) -> (53.5, -5.8902) centre (7.9248, -5.8902) ccw projected
  line L1 (53.5, -5.8902) -> (56.5, -5.8902) projected
  arc A1 (15, -53.9474) -> (56.5, -5.8902) centre (7.9248, -5.8902) ccw projected
  line L2 (15, 4.5) -> (15, -49.3938) projected
  line L3 (15, 16) -> (15, 4.5) projected
  line L4 (15, 16) -> (0, 16) projected
  line L5 (0, 0) -> (0, 16) projected
  line L6 (0, 0) -> (0.8495, -5.8902) projected
  line L7 (0.8495, -5.8902) -> (0.8495, -55.4631) projected
  line L8 (0.8495, -55.4631) -> (15, -55.4631) projected
  arc A2 (15, -55.4631) -> (58, -5.8902) centre (7.9248, -5.8902) ccw projected
  line L9 (58, -5.8902) -> (58, -1.9112) projected
  line L10 (58, -1.9112) -> (52, -1.9112) projected
  line L11 (52, -1.9112) -> (52, 16) projected
  line L12 (52, 16) -> (25, 16) projected
  line L13 (25, 4.5) -> (25, 16) projected
  line L14 (25, -5.8902) -> (25, 4.5) projected
  line L15 (25, -5.8902) -> (52, -5.8902) projected
  arc A3 (15, -49.3938) -> (52, -5.8902) centre (7.9248, -5.8902) ccw projected
  line L16 (25, -5.8902) -> (52, -5.8902) projected
  arc A4 (15, -47.8734) -> (50.5, -5.8902) centre (7.9248, -5.8902) ccw
  arc A5 (14.7221, -57.0155) -> (59.5, -5.8902) centre (7.9248, -5.8902) ccw
  line L17 (0.8495, -55.4631) -> (14.7221, -55.4631)
  line L18 (14.7221, -55.4631) -> (14.7221, -57.0155)
  line L19 (14.7221, -57.0155) -> (0.8495, -57.0155)
  line L20 (0.8495, -57.0155) -> (0.8495, -55.4631)
  line L21 (58, -5.8902) -> (59.5, -5.8902)
  line L22 (58, -1.9112) -> (59.5, -1.9112)
  line L23 (59.5, -1.9112) -> (59.5, -5.8902)
  line L24 (59.5, -5.8902) -> (58, -5.8902)
  line L25 (58, -5.8902) -> (58, -1.9112)
  point P0 (6, 4.5)
  dimension "d109" = 1.5
  dimension "d110" = 1.5
extrude "Extrusion24" add sketch "Sketch24" against normal blind 4 contours A4 L15 A3 L2 | L8 L18 L19 L20 | L8 A2 L21 A5 L18 | L22 L23 L21 L9
sketch "Sketch25" plane through (2, -4.5, 6) normal (1, 0, 0) x (0, 0, -1)
  line L0 (15, -53.9474) -> (15, -50.9129) projected
  arc A0 (15, -50.9129) -> (53.5, -5.8902) centre (7.9248, -5.8902) ccw projected
  line L1 (53.5, -5.8902) -> (56.5, -5.8902) projected
  arc A1 (15, -53.9474) -> (56.5, -5.8902) centre (7.9248, -5.8902) ccw projected
  line L2 (15, 4.5) -> (15, -47.8734) projected
  line L3 (15, 16) -> (15, 4.5) projected
  line L4 (15, 16) -> (0, 16) projected
  line L5 (0, 0) -> (0, 16) projected
  line L6 (0, 0) -> (0.8495, -5.8902) projected
  line L7 (0.8495, -5.8902) -> (0.8495, -57.0155) projected
  line L8 (0.8495, -57.0155) -> (14.7221, -57.0155) projected
  arc A2 (14.7221, -57.0155) -> (59.5, -5.8902) centre (7.9248, -5.8902) ccw projected
  line L9 (59.5, -5.8902) -> (59.5, -1.9112) projected
  line L10 (59.5, -1.9112) -> (52, -1.9112) projected
  line L11 (52, -1.9112) -> (52, 16) projected
  line L12 (52, 16) -> (25, 16) projected
  line L13 (25, 4.5) -> (25, 16) projected
  line L14 (25, -5.8902) -> (25, 4.5) projected
  line L15 (25, -5.8902) -> (50.5, -5.8902) projected
  arc A3 (15, -47.8734) -> (50.5, -5.8902) centre (7.9248, -5.8902) ccw projected
  line L16 (52, 16) -> (59.5, -1.9112)
  point P0 (6, 4.5)
extrude "Extrusion25" add sketch "Sketch25" against normal blind 4 contours L16 L10 L11
sketch "Sketch26" plane through (-6, 5.5, -46) normal (-1, 0, 0) x (0, 0, 1)
  circle A0 centre (23.8821, 2.9481) radius 1.5
  circle A1 centre (23.8821, -12.8383) radius 1.5
  circle A2 centre (40.1179, 2.9481) radius 1.5
  circle A3 centre (40.1179, -12.8383) radius 1.5
  point P0 (46, -5.5)
  dimension "d115" = 3
  dimension "d116" = 3
  dimension "d117" = 3
  dimension "d118" = 3
extrude "Extrusion26" cut sketch "Sketch26" against normal through all contours A1 | A2
sketch "Sketch27" plane through (2, -4.5, 6) normal (1, 0, 0) x (0, 0, -1)
  arc A0 (15, -47.8734) -> (50.5, -5.8902) centre (7.9248, -5.8902) ccw projected
  circle A1 centre (7.9248, -5.8902) radius 2
  point P0 (6, 4.5)
  dimension "d121" = 4
extrude "Extrusion27" cut sketch "Sketch27" against normal through all
sketch "Sketch28" plane through (-6, 5.5, -46) normal (-1, 0, 0) x (0, 0, 1)
  arc A0 (46.0752, -15.8902) -> (42.0752, -15.8902) centre (44.0752, -15.8902) ccw projected
  line L0 (46.0752, -15.8902) -> (51.1505, -15.8902) projected
  line L1 (52, -10) -> (51.1505, -15.8902) projected
  line L2 (37, -10) -> (52, -10) projected
  line L3 (37, -10) -> (37, -15.8902) projected
  line L4 (37, -15.8902) -> (42.0752, -15.8902) projected
  line L5 (37, -15.8902) -> (42.0752, -15.8902) projected
  line L6 (40.5881, -15.8902) -> (52, -15.8902)
  line L7 (52, -15.8902) -> (52, -10)
  line L8 (52, -10) -> (40.5881, -10)
  line L9 (40.5881, -10) -> (40.5881, -15.8902)
  point P0 (46, -5.5)
extrude "Extrusion28" cut sketch "Sketch28" against normal up to surface (2 mm away) contours A0 L4 L9 L2 L1 L0
sketch "Sketch29" plane through (-4, 5.5, -46) normal (-1, 0, 0) x (0, 0, 1)
  line L0 (37, -15.8902) -> (40.5881, -15.8902) projected
  line L1 (37, -55.8902) -> (37, -15.8902) projected
  line L2 (51.1505, -55.8902) -> (37, -55.8902) projected
  line L3 (51.1505, -15.8902) -> (51.1505, -55.8902) projected
  line L4 (52, -10) -> (51.1505, -15.8902) projected
  line L5 (40.5881, -10) -> (52, -10) projected
  line L6 (40.5881, -10) -> (40.5881, -15.8902) projected
  circle A0 centre (44.0752, -15.8902) radius 2 projected
  line L7 (51.1505, -55.8902) -> (37, -55.8902)
  line L8 (37, -55.8902) -> (37, -15.8902)
  line L9 (37, -15.8902) -> (51.1505, -15.8902)
  line L10 (51.1505, -15.8902) -> (51.1505, -55.8902)
  point P0 (46, -5.5)
extrude "Extrusion29" cut sketch "Sketch29" against normal up to surface (2 mm away) contours L0 L9 A0 L3 L2 L1 | L9 A0 picked at (43.9948, -16.552)
sketch "Sketch30" plane through (-6, 5.5, -46) normal (-1, 0, 0) x (0, 0, 1)
  line L0 (40.5881, -15.8902) -> (40.5881, -10) projected
  line L1 (37, -10) -> (40.5881, -10) projected
  line L2 (37, -10) -> (37, -15.8902) projected
  line L3 (37, -15.8902) -> (40.5881, -15.8902) projected
  line L4 (46.0752, -15.8902) -> (51.1505, -15.8902) projected
  line L5 (52, -10) -> (51.1505, -15.8902) projected
  line L6 (40.5881, -10) -> (52, -10) projected
  line L7 (40.5881, -10) -> (40.5881, -15.8902) projected
  line L8 (40.5881, -15.8902) -> (42.0752, -15.8902) projected
  arc A0 (46.0752, -15.8902) -> (42.0752, -15.8902) centre (44.0752, -15.8902) ccw projected
  line L9 (37, -10) -> (52, -10)
  line L10 (52, -10) -> (52, -15.8902)
  line L11 (52, -15.8902) -> (37, -15.8902)
  line L12 (37, -15.8902) -> (37, -10)
  point P0 (46, -5.5)
extrude "Extrusion30" cut sketch "Sketch30" against normal up to surface (4 mm away)
sketch "Sketch31" plane through (-2, -4.5, 6) normal (-1, 0, 0) x (0, 0, 1)
  circle A0 centre (-7.9248, -5.8902) radius 2 projected
  arc A1 (-56.5, -5.8902) -> (-15, -53.9474) centre (-7.9248, -5.8902) ccw projected
  line L0 (-56.5, -5.8902) -> (-53.5, -5.8902) projected
  arc A2 (-53.5, -5.8902) -> (-15, -50.9129) centre (-7.9248, -5.8902) ccw projected
  line L1 (-15, -50.9129) -> (-15, -53.9474) projected
  line L2 (0, 0) -> (-0.8495, -5.8902) projected
  line L3 (-15, 0) -> (0, 0) projected
  line L4 (-15, -47.8734) -> (-15, 0) projected
  arc A3 (-50.5, -5.8902) -> (-15, -47.8734) centre (-7.9248, -5.8902) ccw projected
  line L5 (-52, -5.8902) -> (-50.5, -5.8902) projected
  line L6 (-52, 16) -> (-52, -5.8902) projected
  line L7 (-52, 16) -> (-59.5, -1.9112) projected
  line L8 (-59.5, -1.9112) -> (-59.5, -5.8902) projected
  arc A4 (-59.5, -5.8902) -> (-14.7221, -57.0155) centre (-7.9248, -5.8902) ccw projected
  line L9 (-14.7221, -57.0155) -> (-0.8495, -57.0155) projected
  line L10 (-0.8495, -5.8902) -> (-0.8495, -57.0155) projected
  circle A5 centre (-28.1179, -2.8383) radius 1.5 projected
  line L11 (-52, -5.8902) -> (-25, -5.8902) projected
  line L12 (-25, 0) -> (-25, -5.8902) projected
  line L13 (-52, 0) -> (-25, 0) projected
  line L14 (-52, -5.8902) -> (-52, 0) projected
  line L15 (-59.5, -5.8902) -> (-0.8495, -5.8902)
  line L16 (-0.8495, -5.8902) -> (-0.8495, -57.0155)
  line L17 (-0.8495, -57.0155) -> (-59.5, -57.0155)
  line L18 (-59.5, -57.0155) -> (-59.5, -5.8902)
  point P0 (-6, 4.5)
extrude "Extrusion31" [suppressed]
equation "\"d5\" = 0.5 * d4"
properties part number "eye_cam_angled_bracket"
